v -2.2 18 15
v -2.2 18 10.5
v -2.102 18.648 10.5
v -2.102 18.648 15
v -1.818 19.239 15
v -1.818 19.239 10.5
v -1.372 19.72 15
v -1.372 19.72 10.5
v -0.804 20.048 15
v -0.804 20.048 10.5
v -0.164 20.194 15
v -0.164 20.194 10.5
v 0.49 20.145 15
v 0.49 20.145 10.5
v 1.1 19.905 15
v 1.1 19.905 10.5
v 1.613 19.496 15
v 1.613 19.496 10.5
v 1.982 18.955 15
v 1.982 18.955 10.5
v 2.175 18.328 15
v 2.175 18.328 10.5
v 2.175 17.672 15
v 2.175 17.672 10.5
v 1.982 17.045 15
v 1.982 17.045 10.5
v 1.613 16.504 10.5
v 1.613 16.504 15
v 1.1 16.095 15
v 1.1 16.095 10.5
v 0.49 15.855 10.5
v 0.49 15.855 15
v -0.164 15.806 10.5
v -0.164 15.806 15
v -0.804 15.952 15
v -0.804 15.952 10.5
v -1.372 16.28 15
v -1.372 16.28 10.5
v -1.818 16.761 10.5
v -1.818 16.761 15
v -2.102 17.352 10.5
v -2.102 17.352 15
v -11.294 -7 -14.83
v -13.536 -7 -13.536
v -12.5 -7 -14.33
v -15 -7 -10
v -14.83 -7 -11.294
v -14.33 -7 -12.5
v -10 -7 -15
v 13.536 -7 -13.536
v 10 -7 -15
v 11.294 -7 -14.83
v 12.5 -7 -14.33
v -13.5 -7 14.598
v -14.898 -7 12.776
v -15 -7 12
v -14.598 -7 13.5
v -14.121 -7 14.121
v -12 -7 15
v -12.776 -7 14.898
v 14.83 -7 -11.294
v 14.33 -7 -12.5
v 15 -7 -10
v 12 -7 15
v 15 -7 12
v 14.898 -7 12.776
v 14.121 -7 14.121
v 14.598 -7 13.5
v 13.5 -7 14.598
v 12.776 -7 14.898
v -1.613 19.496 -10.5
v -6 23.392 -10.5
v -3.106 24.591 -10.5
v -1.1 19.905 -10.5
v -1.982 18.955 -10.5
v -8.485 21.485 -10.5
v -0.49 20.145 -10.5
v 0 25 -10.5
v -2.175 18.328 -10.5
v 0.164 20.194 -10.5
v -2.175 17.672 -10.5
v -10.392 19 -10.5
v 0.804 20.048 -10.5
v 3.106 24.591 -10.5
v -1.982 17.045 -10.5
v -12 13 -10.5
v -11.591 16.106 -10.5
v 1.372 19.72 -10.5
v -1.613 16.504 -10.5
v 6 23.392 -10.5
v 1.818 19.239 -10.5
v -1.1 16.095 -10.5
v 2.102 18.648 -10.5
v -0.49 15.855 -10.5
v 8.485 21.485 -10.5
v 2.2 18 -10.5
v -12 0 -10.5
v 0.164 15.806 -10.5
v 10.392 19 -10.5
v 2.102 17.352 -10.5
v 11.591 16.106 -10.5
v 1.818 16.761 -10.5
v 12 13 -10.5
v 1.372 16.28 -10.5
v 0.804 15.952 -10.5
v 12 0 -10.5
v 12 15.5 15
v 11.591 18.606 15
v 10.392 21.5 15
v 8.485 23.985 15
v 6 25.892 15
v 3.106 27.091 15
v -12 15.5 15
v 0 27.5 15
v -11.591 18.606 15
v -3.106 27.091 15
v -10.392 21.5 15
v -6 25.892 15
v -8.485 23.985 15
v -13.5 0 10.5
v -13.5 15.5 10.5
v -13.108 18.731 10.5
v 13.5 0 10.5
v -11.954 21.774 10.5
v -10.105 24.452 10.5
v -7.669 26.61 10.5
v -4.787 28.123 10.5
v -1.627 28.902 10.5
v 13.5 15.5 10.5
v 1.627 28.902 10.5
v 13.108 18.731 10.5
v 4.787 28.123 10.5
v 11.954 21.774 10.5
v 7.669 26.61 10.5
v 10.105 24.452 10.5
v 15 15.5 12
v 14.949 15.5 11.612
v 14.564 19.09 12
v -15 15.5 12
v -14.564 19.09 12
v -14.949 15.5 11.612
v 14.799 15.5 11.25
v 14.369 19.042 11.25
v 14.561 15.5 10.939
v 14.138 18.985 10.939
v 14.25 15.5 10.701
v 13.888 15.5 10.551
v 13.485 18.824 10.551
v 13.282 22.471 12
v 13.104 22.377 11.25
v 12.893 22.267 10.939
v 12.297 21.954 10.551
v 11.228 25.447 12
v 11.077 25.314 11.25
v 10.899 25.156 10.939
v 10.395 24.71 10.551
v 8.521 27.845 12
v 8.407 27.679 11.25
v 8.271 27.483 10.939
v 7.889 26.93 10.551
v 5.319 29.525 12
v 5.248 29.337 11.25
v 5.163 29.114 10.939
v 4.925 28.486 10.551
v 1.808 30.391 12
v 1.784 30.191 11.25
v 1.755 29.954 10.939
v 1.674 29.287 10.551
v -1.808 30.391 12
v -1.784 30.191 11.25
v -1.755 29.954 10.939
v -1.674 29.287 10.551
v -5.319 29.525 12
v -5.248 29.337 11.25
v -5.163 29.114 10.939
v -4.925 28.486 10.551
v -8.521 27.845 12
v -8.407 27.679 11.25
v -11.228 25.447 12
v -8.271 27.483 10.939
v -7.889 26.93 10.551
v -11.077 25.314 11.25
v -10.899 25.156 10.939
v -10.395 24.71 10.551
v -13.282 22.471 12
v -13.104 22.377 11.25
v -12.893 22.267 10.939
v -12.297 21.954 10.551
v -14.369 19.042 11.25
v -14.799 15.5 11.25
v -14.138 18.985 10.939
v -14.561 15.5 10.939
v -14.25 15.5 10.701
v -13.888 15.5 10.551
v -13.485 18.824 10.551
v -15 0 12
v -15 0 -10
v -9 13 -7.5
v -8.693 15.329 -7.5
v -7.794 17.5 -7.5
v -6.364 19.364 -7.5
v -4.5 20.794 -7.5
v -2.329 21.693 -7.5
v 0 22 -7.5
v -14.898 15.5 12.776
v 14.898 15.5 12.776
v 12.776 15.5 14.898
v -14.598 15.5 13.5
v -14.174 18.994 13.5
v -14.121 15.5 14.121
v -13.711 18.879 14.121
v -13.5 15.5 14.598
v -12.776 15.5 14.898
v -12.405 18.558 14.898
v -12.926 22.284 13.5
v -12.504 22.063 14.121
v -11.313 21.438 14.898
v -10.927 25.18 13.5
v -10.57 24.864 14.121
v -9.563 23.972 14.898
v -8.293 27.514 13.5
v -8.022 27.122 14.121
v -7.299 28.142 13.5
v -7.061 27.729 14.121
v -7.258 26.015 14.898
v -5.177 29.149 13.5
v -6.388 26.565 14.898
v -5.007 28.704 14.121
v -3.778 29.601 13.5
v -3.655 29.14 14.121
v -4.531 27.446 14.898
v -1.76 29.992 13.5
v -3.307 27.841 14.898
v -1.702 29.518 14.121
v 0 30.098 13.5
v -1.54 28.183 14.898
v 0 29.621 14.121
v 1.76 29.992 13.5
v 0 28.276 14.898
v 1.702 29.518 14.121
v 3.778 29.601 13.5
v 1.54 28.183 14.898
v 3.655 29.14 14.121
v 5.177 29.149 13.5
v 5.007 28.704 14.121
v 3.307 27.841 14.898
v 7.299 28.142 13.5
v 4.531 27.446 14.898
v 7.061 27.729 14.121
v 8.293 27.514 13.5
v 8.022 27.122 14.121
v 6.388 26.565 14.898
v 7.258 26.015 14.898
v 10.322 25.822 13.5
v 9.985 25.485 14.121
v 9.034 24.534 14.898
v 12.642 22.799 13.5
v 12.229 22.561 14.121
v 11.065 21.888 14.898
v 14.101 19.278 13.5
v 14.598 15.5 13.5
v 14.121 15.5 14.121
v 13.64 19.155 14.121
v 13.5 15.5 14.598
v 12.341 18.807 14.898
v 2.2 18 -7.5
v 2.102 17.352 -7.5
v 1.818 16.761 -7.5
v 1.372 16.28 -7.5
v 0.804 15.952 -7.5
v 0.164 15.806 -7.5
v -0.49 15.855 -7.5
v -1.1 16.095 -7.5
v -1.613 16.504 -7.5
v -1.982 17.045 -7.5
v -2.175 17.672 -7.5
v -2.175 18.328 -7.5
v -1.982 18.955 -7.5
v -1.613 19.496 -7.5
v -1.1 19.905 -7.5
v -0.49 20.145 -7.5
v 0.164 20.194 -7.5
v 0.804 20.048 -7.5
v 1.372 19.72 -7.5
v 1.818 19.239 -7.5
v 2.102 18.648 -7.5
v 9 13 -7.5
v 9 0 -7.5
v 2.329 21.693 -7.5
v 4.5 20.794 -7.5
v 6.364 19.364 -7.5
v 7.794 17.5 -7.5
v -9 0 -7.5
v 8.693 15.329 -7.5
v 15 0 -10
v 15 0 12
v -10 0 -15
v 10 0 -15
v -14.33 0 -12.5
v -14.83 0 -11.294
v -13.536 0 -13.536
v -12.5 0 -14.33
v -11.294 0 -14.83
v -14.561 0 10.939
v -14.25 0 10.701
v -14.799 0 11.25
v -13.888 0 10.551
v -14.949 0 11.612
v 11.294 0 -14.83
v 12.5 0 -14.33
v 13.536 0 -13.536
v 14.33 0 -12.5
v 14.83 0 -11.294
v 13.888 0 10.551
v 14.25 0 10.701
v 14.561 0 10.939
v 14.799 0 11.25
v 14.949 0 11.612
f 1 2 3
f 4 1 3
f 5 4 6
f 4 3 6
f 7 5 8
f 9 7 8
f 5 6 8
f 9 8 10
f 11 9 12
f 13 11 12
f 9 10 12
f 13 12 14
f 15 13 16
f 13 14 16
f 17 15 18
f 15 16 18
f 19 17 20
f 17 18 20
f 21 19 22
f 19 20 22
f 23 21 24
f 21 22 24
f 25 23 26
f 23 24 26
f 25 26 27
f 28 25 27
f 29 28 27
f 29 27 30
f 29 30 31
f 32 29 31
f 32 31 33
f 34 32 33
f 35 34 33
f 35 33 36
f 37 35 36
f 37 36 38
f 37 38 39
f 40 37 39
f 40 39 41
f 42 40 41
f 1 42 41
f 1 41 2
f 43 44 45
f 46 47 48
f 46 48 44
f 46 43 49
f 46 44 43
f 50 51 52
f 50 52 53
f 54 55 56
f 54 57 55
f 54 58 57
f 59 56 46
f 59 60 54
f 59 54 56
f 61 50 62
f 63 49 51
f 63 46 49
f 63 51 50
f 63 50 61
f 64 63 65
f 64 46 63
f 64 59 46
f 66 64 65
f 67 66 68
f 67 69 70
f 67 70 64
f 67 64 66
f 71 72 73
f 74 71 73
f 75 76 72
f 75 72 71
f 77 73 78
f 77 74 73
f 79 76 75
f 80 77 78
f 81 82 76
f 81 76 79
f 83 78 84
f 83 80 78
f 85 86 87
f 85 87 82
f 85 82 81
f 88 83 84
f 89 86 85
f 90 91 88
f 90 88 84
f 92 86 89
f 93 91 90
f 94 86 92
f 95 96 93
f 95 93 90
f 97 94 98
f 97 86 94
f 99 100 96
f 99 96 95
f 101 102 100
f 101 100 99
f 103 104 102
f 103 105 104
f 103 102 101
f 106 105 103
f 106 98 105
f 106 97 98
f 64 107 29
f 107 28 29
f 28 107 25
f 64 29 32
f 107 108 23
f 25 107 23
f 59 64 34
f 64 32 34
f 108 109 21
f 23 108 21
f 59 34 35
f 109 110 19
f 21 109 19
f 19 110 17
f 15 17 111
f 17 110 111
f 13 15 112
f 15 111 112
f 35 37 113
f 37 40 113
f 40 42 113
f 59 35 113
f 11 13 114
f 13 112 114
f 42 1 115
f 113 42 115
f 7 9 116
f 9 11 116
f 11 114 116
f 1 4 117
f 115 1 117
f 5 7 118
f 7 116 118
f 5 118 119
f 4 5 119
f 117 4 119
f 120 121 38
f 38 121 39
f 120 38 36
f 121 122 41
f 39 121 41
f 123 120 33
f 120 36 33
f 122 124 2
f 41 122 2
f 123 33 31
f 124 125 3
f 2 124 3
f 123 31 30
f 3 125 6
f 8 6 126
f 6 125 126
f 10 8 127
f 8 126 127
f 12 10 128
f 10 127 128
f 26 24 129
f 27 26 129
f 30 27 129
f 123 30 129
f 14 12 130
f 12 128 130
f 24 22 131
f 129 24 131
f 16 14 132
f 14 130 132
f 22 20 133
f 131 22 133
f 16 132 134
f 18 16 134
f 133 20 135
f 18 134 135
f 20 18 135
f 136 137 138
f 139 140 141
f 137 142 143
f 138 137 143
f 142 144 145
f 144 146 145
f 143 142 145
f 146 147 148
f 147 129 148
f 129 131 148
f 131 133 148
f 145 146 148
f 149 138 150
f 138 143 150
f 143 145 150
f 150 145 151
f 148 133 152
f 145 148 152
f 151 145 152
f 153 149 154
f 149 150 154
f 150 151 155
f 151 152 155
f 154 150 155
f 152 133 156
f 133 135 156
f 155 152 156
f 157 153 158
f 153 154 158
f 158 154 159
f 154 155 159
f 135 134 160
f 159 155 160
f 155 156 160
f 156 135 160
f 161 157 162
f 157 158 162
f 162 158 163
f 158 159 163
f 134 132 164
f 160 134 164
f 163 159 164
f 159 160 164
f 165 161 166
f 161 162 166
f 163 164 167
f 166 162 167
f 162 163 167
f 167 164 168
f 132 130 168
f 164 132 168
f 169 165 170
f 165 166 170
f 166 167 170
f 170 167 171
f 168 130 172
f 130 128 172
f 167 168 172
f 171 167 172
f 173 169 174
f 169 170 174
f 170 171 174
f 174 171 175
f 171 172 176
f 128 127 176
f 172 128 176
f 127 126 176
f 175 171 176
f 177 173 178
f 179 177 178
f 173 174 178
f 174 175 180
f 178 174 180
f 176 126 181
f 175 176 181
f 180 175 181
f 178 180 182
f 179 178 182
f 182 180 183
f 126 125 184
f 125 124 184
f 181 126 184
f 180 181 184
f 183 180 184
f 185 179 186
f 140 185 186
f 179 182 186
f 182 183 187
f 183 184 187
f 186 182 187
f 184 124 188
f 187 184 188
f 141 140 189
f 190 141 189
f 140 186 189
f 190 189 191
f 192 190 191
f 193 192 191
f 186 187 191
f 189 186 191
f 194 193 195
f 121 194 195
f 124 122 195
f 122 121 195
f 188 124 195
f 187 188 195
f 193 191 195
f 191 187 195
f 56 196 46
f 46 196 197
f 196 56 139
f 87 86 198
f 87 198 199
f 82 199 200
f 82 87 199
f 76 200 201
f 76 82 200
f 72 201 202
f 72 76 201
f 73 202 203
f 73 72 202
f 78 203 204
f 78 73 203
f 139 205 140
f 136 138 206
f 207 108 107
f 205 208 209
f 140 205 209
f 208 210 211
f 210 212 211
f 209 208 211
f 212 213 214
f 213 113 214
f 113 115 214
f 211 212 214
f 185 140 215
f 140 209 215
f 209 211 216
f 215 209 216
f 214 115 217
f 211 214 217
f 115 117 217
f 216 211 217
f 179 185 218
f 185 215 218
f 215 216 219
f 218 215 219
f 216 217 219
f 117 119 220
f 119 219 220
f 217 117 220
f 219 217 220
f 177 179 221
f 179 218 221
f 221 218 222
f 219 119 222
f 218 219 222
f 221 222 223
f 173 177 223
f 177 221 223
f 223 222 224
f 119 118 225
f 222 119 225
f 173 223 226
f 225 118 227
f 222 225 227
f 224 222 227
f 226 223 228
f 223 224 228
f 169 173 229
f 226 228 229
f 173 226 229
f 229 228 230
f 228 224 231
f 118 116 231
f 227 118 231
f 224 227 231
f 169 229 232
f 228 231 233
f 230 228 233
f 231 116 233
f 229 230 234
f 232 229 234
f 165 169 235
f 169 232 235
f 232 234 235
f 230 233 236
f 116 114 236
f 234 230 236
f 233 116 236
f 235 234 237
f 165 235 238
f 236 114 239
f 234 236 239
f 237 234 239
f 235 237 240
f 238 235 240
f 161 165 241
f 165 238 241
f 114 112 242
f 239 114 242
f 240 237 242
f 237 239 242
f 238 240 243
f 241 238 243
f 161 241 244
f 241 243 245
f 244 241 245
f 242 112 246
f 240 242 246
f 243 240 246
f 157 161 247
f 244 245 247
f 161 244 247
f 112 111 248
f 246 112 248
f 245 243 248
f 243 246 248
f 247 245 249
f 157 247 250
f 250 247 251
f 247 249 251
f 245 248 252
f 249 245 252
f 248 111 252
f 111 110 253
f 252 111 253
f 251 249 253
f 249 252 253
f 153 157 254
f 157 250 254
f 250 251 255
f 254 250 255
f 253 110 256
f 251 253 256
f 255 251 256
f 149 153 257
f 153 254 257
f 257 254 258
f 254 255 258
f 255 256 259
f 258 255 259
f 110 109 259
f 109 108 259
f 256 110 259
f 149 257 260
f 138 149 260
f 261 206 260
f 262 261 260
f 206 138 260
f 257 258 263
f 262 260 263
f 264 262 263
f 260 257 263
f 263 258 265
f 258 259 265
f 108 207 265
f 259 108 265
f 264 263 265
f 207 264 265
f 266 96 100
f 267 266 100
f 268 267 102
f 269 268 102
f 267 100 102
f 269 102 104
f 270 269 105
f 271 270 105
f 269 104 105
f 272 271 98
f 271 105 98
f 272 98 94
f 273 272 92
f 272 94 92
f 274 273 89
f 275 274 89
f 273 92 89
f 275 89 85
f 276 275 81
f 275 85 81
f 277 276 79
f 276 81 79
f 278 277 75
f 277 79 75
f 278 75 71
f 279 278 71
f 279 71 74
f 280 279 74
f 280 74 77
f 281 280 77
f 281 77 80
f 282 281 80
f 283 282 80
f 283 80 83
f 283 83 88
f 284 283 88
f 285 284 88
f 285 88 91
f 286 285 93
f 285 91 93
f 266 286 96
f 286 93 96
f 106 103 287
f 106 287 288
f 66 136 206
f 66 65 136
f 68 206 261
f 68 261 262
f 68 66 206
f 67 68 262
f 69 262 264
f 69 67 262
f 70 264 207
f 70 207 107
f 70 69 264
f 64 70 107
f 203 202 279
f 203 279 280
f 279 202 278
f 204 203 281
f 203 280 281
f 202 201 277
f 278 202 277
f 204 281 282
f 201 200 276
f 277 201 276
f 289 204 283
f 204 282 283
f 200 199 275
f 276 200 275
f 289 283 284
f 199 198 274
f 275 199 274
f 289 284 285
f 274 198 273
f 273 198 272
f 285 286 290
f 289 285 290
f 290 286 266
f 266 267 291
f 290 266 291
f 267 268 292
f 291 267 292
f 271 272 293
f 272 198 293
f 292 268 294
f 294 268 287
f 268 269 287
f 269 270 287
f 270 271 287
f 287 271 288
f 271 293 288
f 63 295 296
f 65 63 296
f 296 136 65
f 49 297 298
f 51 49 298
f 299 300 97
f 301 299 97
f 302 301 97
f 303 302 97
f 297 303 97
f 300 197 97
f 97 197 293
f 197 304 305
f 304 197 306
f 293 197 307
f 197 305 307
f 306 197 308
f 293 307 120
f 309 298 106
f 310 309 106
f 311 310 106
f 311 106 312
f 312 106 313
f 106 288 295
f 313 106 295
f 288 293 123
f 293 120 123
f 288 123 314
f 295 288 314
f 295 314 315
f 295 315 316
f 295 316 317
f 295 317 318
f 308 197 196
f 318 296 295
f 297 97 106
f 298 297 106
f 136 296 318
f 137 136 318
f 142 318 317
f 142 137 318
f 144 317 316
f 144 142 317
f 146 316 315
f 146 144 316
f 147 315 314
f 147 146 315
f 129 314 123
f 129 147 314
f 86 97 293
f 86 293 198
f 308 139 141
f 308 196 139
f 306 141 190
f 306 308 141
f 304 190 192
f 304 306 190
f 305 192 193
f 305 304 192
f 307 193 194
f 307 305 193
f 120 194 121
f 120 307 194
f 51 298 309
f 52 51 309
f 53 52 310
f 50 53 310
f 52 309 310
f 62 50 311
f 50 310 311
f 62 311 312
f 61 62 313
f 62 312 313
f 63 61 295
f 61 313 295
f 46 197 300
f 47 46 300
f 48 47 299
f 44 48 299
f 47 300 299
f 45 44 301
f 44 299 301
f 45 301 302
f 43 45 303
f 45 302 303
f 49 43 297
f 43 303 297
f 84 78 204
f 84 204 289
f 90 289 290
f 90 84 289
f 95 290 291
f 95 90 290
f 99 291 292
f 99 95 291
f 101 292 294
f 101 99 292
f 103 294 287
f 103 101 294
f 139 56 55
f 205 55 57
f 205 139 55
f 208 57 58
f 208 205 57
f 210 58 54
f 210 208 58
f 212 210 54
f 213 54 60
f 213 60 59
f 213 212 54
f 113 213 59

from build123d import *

# Parameters (mm, degrees)
F1_DEPTH  = 7
F3_DEPTH  = 4.5
F4_R      = 3
F5_R      = 1.49999
F7_D      = 4.4
F10_DEPTH = 3
F11_R     = 2.2
F12_DEPTH = 3
F13_SIZE  = 2.99999


# Not quite as in the source:
# - a fillet or chamfer is up to 0.001 mm smaller than in the source, because OpenCascade refuses the exact size


with BuildPart() as f1:
    # F0 (on Front) → F1 (new body)
    with BuildSketch(Plane.XZ):
        with BuildLine():
            Line((15, -10), (15, 15))
            Line((15, 15), (-15, 15))
            Line((-15, 15), (-15, -10))
            ThreePointArc((-15, -10), (-13.5355339059, -13.5355339059), (-10, -15))
            Line((-10, -15), (10, -15))
            ThreePointArc((10, -15), (13.5355339059, -13.5355339059), (15, -10))
        make_face()
    extrude(amount=F1_DEPTH)

    # F2 (on face) → F3 (join)
    with BuildSketch(Plane.XY.offset(15)):
        with BuildLine():
            Line((-15, 0), (-15, -7))
            Line((-15, -7), (15, -7))
            Line((15, -7), (15, 0))
            Line((15, 0), (15, 15.5))
            ThreePointArc((15, 15.5), (10.6066017178, 26.1066017178), (0, 30.5))
            ThreePointArc((0, 30.5), (-10.6066017178, 26.1066017178), (-15, 15.5))
            Line((-15, 15.5), (-15, 0))
        make_face()
    extrude(amount=-F3_DEPTH)

    # F4
    f4_edges = [f1.edges().sort_by_distance(p)[0] for p in [
        (15, 4.25, 15),
    ]]
    fillet(f4_edges, radius=F4_R)

    # F5 (radius 1.5 in the source; OpenCascade refuses exactly that, so slightly less here)
    f5_edges = [f1.edges().sort_by_distance(p)[0] for p in [
        (15, 7.75, 10.5),
    ]]
    fillet(f5_edges, radius=F5_R)

    # F7 (through all)
    with Locations(Plane.XY.offset(15)):
        with Locations((0, 18)):
            Hole(F7_D / 2)

    # F9 (on offset) → F10 (join)
    with BuildSketch(Plane(origin=(0, 0, -10.5), x_dir=(1, 0, 0), z_dir=(0, 0, -1))):
        with BuildLine():
            Line((12, 0), (-12, 0))
            Line((-12, 0), (-12, -13))
            ThreePointArc((-12, -13), (-8.4852813742, -21.4852813742), (0, -25))
            ThreePointArc((0, -25), (8.4852813742, -21.4852813742), (12, -13))
            Line((12, -13), (12, 0))
        make_face()
    extrude(amount=-F10_DEPTH)

    # F11 (on face) → F12 (cut)
    with BuildSketch(Plane(origin=(0, 0, -10.5), x_dir=(1, 0, 0), z_dir=(0, 0, -1))):
        with Locations((0, -18)):
            Circle(F11_R)
    extrude(amount=-F12_DEPTH, mode=Mode.SUBTRACT)

    # F13 (size 3 in the source; OpenCascade refuses exactly that, so slightly less here)
    f13_edges = [f1.edges().sort_by_distance(p)[0] for p in [
        (-12, 6.5, -7.5),
    ]]
    chamfer(f13_edges, length=F13_SIZE)


solid = f1.part
